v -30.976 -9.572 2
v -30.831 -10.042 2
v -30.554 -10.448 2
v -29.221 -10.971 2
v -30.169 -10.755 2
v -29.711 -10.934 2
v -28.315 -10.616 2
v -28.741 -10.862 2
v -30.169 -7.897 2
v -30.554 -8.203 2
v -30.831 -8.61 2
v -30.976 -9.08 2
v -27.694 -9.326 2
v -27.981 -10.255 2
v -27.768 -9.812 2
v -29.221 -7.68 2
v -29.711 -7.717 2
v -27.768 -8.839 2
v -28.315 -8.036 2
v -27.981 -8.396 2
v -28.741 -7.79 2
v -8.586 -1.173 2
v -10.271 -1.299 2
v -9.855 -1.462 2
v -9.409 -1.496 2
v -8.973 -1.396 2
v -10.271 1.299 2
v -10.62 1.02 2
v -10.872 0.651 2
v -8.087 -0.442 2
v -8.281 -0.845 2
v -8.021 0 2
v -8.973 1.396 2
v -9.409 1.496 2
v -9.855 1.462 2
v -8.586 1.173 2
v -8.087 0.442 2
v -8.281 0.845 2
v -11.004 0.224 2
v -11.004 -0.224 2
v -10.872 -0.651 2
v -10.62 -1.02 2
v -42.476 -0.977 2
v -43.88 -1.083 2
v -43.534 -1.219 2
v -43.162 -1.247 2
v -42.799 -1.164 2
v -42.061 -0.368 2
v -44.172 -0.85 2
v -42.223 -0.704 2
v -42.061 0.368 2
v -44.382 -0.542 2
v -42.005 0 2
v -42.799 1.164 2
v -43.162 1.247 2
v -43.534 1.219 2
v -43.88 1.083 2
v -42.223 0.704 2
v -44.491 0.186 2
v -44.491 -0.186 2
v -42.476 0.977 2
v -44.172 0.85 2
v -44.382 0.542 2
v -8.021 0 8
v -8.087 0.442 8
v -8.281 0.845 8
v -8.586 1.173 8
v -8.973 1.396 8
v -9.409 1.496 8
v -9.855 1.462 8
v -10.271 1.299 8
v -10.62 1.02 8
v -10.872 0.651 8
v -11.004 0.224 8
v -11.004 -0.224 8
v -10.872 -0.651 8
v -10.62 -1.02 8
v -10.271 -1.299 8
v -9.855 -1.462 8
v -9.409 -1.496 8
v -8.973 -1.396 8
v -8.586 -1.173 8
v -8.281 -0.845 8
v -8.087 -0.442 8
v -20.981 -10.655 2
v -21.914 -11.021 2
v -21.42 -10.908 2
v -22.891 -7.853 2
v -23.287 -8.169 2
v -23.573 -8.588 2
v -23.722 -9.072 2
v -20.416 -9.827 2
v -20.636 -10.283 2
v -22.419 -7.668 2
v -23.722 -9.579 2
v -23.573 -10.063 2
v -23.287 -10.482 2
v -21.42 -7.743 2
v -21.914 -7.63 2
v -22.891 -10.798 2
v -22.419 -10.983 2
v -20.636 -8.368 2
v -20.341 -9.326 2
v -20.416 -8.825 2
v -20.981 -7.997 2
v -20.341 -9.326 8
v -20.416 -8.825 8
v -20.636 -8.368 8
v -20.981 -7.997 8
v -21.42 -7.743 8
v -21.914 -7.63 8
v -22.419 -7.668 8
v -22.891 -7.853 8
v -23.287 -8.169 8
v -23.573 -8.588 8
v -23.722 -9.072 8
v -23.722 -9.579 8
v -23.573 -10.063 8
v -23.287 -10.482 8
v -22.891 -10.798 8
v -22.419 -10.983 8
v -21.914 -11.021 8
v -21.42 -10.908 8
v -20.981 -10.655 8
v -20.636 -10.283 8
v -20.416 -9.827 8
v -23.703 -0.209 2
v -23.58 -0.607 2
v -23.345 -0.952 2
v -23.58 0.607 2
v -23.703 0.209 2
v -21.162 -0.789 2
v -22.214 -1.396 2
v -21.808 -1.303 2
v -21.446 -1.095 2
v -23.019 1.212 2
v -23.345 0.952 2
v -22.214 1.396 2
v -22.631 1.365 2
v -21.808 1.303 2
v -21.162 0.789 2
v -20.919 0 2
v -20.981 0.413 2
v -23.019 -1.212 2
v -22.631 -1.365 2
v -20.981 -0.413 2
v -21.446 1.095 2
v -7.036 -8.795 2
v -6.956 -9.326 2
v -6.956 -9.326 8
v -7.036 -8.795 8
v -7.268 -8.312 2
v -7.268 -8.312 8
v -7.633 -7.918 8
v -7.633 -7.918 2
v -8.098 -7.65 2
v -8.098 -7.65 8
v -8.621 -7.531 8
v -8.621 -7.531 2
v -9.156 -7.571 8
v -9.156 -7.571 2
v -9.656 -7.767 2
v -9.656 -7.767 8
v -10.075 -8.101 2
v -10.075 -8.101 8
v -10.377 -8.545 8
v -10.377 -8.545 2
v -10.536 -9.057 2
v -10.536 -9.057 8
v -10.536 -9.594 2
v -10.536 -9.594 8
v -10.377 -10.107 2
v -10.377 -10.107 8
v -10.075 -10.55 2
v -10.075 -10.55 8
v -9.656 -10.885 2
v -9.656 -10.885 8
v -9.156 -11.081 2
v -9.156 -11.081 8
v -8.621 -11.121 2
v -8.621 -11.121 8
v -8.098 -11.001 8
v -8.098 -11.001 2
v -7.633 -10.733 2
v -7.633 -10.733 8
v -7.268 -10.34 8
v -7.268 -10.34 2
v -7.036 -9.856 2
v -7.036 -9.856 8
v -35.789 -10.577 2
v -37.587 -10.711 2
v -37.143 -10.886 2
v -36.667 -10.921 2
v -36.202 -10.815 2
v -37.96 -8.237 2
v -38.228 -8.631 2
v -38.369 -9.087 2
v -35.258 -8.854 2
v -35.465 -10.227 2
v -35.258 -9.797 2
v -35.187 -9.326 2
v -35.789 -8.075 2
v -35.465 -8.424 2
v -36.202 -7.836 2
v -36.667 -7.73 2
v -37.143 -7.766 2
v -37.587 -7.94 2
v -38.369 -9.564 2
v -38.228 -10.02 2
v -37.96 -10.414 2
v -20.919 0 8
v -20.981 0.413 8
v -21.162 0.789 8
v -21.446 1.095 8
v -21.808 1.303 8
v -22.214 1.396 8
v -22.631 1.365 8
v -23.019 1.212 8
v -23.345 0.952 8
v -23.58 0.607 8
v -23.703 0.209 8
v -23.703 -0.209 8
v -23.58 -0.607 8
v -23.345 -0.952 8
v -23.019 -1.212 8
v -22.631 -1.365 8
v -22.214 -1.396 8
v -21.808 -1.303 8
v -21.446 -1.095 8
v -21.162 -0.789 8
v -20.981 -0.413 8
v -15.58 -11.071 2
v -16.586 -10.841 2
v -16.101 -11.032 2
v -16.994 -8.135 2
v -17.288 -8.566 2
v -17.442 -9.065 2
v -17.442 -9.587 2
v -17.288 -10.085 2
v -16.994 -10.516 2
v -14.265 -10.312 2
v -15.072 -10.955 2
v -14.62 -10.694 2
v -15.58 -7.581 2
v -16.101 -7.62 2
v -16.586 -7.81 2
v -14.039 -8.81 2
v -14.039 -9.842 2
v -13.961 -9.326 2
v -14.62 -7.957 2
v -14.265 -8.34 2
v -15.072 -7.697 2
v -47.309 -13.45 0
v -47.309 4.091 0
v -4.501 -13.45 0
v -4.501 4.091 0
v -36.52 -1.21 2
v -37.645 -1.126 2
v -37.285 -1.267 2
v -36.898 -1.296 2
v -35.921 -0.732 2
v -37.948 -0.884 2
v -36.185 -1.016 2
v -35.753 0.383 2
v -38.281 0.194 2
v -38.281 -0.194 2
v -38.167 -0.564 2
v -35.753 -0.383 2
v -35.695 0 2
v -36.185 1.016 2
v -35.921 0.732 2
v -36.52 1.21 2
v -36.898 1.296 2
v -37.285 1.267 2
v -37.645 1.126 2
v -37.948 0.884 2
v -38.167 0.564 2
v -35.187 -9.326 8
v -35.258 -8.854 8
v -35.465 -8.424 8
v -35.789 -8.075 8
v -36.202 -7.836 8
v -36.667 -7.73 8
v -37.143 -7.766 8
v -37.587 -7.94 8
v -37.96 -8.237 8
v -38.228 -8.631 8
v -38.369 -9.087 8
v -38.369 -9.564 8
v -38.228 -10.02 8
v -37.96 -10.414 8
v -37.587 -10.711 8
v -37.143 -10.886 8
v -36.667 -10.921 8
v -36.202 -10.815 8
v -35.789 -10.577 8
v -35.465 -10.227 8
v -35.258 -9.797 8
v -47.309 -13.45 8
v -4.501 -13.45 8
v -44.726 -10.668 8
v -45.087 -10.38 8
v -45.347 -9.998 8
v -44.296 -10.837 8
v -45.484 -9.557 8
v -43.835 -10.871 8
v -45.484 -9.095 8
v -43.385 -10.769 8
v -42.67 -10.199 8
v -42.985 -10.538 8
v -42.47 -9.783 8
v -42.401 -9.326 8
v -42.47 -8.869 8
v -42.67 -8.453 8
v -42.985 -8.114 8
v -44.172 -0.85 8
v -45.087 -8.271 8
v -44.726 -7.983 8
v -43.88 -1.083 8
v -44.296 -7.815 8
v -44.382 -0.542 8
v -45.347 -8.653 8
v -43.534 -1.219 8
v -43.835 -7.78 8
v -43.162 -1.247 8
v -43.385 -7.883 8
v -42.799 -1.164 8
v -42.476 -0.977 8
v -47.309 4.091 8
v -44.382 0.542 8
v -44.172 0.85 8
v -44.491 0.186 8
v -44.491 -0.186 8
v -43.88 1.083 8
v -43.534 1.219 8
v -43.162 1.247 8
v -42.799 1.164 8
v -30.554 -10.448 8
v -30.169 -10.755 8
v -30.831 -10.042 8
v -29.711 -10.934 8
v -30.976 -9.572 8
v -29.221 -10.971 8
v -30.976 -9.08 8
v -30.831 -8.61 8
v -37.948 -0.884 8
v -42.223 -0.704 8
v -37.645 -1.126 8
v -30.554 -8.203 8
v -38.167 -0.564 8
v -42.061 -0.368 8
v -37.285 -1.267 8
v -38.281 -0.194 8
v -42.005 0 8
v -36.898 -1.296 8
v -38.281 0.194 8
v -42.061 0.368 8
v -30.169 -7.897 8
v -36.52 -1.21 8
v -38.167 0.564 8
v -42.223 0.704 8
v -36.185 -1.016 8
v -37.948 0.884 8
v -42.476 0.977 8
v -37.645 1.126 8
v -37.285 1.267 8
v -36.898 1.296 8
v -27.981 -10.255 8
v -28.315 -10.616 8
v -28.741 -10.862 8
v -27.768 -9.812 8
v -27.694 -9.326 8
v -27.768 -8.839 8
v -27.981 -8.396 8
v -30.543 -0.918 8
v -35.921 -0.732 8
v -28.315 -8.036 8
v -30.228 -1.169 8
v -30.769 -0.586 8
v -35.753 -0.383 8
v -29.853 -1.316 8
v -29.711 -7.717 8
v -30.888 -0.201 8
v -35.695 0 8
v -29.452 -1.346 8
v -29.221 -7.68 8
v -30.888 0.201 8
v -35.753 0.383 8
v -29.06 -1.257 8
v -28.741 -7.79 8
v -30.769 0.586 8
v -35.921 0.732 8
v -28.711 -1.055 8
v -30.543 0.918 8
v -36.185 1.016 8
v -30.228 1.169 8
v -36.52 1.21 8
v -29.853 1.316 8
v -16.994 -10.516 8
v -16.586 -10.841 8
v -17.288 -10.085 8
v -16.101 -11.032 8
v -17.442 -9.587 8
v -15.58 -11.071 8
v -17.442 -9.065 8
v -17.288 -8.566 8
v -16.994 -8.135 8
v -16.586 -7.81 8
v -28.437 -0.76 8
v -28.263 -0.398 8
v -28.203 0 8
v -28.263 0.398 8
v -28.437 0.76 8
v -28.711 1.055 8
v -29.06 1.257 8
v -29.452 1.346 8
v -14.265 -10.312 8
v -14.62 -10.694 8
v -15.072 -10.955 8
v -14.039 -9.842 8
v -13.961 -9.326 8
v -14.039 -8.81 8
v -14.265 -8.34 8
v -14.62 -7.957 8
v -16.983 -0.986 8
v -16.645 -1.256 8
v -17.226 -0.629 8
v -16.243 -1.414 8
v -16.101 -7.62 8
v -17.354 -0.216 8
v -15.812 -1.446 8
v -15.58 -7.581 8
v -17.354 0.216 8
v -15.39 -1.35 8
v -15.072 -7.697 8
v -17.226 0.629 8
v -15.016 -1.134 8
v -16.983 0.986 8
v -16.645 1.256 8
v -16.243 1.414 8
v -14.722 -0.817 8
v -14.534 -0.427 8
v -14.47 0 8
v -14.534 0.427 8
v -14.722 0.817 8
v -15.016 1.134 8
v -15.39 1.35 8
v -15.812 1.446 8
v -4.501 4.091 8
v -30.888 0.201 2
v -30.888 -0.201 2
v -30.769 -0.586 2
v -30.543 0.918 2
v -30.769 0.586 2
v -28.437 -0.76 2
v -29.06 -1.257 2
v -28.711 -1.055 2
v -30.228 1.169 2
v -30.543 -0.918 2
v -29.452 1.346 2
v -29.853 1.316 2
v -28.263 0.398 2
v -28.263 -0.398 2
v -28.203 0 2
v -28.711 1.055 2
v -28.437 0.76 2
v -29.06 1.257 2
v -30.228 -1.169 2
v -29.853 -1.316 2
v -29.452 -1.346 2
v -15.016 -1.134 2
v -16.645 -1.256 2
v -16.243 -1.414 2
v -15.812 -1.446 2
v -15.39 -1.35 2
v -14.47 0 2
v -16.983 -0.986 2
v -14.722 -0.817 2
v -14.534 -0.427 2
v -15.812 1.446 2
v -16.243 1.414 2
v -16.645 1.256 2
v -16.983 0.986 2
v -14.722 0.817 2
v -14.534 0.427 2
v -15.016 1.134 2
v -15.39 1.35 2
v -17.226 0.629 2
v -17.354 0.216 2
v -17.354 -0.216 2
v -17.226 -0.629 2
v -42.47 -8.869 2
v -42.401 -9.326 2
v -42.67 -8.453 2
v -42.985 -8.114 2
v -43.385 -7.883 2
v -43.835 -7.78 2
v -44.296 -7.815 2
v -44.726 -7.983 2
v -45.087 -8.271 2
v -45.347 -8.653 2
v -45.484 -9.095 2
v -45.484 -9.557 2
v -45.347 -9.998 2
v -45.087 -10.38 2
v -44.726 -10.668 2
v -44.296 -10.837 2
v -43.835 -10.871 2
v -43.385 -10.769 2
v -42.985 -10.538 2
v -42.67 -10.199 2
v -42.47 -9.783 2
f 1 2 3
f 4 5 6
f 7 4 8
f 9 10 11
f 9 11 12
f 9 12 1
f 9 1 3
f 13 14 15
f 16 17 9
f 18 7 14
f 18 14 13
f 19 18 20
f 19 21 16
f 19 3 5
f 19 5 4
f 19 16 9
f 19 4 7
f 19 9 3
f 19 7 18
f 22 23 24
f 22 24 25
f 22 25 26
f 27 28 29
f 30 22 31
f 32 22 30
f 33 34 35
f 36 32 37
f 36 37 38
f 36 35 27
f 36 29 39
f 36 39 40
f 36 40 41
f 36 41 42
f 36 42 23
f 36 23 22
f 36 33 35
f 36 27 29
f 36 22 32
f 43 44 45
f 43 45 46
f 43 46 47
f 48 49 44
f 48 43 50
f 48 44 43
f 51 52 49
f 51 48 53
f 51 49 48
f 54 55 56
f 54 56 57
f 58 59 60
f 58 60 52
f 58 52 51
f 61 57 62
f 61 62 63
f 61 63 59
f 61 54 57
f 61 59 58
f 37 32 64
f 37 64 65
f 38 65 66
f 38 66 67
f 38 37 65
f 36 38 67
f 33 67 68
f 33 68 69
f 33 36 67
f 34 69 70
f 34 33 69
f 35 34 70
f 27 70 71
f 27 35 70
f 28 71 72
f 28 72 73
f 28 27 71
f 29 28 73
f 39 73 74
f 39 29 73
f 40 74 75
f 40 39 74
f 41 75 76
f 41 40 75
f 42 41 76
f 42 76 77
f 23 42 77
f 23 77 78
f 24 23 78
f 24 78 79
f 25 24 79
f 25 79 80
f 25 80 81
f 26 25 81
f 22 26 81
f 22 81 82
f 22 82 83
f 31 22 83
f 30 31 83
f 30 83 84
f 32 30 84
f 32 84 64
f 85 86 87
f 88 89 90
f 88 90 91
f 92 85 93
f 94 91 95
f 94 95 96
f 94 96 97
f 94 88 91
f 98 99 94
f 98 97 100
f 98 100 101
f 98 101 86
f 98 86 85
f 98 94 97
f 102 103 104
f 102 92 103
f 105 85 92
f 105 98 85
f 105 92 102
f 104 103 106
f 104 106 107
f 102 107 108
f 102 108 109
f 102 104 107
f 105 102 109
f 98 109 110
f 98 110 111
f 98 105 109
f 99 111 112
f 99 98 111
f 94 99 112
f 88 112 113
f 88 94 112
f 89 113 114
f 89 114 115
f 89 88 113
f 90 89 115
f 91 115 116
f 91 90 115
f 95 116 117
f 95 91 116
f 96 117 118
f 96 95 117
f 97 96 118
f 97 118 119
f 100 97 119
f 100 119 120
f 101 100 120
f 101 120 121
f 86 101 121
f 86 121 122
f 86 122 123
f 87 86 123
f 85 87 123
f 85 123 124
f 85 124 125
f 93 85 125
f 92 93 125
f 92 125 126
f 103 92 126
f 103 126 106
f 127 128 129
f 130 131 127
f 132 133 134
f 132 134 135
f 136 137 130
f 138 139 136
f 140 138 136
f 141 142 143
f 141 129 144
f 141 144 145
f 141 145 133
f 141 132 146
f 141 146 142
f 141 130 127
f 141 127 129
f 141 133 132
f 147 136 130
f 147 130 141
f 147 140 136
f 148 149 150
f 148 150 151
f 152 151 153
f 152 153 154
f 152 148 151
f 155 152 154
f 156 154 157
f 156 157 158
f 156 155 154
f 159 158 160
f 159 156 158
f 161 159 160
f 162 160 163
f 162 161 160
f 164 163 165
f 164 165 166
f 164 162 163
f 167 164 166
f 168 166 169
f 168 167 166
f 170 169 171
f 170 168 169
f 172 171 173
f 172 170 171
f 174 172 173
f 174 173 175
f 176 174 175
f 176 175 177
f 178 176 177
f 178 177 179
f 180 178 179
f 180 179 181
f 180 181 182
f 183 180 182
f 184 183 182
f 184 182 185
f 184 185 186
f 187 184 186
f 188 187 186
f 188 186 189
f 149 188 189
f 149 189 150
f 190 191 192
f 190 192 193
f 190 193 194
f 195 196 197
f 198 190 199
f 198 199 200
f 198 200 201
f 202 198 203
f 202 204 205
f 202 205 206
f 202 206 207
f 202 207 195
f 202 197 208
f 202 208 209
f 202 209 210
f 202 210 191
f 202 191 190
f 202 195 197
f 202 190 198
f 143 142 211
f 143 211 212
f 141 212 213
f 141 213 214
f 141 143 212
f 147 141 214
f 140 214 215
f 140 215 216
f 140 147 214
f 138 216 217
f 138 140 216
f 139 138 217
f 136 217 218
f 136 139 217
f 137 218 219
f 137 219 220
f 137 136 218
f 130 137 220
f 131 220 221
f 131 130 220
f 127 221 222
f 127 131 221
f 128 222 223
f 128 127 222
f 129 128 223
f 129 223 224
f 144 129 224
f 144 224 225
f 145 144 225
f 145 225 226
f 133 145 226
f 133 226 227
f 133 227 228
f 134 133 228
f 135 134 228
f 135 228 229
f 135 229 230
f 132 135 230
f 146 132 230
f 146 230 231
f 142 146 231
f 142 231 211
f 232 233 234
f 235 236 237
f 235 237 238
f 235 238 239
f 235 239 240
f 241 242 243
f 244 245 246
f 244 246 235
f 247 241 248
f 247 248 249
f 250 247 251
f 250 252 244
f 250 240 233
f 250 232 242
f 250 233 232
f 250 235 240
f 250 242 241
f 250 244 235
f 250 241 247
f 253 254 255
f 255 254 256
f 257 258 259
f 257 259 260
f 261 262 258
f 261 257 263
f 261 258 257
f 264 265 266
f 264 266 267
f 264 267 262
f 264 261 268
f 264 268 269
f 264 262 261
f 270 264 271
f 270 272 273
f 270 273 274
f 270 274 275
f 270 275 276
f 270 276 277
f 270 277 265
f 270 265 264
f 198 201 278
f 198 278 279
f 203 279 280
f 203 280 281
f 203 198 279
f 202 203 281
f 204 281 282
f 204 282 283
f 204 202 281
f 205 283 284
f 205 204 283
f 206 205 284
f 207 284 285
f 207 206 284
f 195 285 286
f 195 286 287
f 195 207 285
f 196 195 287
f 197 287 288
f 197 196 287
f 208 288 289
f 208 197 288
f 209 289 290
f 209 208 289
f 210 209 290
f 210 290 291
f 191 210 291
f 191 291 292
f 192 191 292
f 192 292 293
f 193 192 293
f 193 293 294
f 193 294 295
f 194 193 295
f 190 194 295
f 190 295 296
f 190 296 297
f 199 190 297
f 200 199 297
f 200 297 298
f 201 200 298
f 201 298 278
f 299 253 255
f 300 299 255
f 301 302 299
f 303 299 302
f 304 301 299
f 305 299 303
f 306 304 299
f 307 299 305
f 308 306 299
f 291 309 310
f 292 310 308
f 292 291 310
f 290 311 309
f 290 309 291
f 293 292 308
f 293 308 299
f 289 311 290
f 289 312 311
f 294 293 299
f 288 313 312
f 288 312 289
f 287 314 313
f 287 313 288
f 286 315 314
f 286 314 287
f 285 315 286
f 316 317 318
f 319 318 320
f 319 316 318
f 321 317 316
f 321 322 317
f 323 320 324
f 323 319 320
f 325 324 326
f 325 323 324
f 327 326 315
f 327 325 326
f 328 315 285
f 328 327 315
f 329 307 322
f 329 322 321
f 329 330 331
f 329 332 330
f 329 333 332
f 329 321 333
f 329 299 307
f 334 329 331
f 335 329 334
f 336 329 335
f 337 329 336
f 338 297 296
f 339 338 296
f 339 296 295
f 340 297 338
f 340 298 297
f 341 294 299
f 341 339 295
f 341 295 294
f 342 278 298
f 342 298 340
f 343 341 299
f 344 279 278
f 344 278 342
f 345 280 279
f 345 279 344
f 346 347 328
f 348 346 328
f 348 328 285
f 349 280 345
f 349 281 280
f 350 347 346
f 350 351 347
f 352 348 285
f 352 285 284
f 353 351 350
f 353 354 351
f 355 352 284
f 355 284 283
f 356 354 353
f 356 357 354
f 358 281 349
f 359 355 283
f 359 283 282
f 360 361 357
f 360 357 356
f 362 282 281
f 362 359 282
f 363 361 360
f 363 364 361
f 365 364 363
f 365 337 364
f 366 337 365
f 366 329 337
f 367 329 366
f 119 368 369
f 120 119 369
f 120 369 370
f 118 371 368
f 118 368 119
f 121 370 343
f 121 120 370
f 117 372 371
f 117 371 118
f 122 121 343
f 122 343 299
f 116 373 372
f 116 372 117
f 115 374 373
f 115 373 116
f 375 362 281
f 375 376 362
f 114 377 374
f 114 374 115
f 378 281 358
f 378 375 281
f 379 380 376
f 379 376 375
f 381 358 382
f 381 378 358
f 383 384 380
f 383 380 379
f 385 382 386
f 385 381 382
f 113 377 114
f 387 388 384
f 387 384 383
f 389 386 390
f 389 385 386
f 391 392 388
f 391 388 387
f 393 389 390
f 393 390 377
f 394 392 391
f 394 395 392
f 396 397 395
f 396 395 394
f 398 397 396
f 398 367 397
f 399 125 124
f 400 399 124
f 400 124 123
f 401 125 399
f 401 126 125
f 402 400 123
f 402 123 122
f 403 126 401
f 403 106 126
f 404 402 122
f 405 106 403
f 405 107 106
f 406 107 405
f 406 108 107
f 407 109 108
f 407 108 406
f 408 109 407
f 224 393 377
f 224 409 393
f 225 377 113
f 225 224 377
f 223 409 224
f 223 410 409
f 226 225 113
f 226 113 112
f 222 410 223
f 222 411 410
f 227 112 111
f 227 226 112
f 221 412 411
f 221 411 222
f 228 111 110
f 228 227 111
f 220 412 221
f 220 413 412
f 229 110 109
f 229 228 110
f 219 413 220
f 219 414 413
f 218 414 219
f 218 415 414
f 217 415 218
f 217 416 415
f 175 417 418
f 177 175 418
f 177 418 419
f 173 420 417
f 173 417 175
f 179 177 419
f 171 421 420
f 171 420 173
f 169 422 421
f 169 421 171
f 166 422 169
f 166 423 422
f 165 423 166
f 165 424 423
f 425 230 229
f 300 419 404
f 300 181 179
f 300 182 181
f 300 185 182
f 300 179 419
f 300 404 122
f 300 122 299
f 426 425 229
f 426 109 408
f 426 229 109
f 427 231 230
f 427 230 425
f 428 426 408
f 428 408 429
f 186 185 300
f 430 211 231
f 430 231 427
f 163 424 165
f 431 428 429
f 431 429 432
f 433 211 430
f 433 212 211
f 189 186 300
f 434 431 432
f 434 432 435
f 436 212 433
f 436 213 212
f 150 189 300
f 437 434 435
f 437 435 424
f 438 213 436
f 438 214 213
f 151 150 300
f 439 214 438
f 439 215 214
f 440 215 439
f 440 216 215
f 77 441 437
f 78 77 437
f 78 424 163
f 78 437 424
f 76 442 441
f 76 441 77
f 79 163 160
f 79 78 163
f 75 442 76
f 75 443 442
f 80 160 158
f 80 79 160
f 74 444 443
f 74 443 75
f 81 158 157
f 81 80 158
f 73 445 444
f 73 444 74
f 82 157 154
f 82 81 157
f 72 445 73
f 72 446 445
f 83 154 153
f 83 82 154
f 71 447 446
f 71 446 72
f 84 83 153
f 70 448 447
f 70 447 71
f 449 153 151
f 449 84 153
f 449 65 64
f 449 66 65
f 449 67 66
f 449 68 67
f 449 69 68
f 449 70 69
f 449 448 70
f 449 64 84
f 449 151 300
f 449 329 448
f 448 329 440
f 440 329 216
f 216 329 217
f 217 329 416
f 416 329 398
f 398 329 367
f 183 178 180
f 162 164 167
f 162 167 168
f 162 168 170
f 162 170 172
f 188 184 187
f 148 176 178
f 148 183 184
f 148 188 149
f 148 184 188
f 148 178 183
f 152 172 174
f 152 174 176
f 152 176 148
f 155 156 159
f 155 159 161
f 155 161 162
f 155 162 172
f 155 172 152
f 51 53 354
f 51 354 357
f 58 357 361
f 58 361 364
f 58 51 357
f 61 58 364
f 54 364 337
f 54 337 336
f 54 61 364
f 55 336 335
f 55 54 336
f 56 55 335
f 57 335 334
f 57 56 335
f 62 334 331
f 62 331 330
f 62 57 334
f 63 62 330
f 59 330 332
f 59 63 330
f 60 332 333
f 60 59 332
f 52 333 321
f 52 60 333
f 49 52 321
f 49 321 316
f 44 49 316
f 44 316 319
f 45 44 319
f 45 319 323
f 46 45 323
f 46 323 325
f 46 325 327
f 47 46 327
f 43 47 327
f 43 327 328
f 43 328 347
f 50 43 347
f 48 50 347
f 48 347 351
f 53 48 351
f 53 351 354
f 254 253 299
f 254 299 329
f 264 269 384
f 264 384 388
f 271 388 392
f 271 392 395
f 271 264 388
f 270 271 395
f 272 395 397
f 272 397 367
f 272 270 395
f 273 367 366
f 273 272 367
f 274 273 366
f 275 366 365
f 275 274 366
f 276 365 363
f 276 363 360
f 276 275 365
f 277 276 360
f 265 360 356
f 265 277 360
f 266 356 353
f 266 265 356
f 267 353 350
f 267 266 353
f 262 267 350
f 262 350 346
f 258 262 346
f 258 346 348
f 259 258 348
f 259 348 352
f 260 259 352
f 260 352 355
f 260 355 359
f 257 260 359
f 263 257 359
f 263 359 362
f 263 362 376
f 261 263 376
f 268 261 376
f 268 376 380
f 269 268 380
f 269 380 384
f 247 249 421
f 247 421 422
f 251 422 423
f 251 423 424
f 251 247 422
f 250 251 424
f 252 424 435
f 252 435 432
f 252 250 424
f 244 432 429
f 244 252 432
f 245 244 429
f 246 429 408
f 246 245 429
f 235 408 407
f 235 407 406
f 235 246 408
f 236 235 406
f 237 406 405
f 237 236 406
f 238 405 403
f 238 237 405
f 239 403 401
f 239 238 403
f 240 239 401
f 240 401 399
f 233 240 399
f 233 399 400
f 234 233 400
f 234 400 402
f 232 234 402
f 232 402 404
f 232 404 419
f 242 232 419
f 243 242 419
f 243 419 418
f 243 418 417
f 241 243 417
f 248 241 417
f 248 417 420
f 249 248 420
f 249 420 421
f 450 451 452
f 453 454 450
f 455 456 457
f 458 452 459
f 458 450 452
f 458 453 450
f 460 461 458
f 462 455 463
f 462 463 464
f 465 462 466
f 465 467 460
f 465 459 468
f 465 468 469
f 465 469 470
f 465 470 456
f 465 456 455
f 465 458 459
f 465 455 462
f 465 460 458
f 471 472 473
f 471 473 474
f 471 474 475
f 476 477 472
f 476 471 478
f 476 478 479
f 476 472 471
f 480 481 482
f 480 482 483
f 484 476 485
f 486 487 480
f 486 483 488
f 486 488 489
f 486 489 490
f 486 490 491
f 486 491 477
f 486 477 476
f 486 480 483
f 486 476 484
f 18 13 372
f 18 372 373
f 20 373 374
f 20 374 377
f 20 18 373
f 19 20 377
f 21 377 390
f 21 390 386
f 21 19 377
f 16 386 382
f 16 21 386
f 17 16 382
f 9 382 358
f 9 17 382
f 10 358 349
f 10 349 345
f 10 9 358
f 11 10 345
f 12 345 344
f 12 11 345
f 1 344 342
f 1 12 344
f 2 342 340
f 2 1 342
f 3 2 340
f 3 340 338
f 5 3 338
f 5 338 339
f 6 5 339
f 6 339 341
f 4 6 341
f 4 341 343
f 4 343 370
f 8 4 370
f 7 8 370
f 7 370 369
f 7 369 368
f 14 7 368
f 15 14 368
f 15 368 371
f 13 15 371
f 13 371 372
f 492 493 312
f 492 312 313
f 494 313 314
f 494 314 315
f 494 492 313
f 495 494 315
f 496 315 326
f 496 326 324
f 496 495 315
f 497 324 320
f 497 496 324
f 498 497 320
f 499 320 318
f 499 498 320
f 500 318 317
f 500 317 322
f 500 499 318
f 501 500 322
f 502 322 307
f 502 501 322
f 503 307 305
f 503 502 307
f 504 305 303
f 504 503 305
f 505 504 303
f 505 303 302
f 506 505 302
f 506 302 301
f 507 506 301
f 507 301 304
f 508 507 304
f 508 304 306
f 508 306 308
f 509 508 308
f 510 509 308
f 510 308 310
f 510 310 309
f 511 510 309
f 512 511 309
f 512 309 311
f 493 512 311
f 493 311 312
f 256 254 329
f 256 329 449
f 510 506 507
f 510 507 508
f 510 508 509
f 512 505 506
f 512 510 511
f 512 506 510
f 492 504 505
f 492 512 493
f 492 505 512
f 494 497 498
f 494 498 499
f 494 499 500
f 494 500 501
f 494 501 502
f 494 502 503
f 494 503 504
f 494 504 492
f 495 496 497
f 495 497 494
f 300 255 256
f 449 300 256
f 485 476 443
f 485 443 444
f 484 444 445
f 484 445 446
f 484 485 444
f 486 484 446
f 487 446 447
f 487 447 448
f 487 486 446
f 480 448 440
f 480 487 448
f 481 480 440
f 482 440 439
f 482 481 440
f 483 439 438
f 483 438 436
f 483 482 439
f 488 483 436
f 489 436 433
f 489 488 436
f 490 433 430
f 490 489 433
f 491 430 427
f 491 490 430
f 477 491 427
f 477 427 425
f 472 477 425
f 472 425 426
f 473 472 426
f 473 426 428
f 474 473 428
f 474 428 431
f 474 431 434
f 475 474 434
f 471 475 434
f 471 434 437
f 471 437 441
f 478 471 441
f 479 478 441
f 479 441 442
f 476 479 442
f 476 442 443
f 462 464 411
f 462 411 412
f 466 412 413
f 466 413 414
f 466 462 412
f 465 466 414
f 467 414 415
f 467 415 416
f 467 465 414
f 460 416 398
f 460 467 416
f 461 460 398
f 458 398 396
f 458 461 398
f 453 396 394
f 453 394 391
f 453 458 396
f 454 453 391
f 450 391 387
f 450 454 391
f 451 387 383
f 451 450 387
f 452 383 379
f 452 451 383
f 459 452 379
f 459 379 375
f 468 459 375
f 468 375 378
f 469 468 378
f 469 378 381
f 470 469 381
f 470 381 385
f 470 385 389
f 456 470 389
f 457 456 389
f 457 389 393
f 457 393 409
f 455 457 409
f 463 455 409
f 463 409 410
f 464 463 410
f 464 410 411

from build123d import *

# Parameters (mm, degrees)
F0_W     = 42.807285
F0_H     = 17.540547
F0_R     = 1.55
F0_R_2   = 1.6
F0_R_3   = 1.65
F0_R_4   = 1.7
F0_R_5   = 1.75
F0_R_6   = 1.8
F0_R_7   = 1.25
F0_R_8   = 1.3
F0_R_9   = 1.35
F0_R_10  = 1.4
F0_R_11  = 1.45
F0_R_12  = 1.5
F1_DEPTH = 8
F2_DEPTH = 2


with BuildPart() as f1:
    # F0 (on Top) → F1 (new body)
    with BuildSketch(Plane.XY):
        with Locations((-25.905089, -4.67933)):
            Rectangle(F0_W, F0_H)
        with Locations((-43.950986, -9.325703)):
            Circle(F0_R, mode=Mode.SUBTRACT)
        with Locations((-36.78672, -9.325703)):
            Circle(F0_R_2, mode=Mode.SUBTRACT)
        with Locations((-29.344233, -9.325703)):
            Circle(F0_R_3, mode=Mode.SUBTRACT)
        with Locations((-22.040857, -9.325703)):
            Circle(F0_R_4, mode=Mode.SUBTRACT)
        with Locations((-15.711265, -9.325703)):
            Circle(F0_R_5, mode=Mode.SUBTRACT)
        with Locations((-8.755669, -9.325703)):
            Circle(F0_R_6, mode=Mode.SUBTRACT)
        with Locations((-43.255426, 0)):
            Circle(F0_R_7, mode=Mode.SUBTRACT)
        with Locations((-36.995389, 0)):
            Circle(F0_R_8, mode=Mode.SUBTRACT)
        with Locations((-29.552901, 0)):
            Circle(F0_R_9, mode=Mode.SUBTRACT)
        with Locations((-22.319082, 0)):
            Circle(F0_R_10, mode=Mode.SUBTRACT)
        with Locations((-15.919933, 0)):
            Circle(F0_R_11, mode=Mode.SUBTRACT)
        with Locations((-9.520785, 0)):
            Circle(F0_R_12, mode=Mode.SUBTRACT)
    extrude(amount=F1_DEPTH)

    # F0 (on Top) → F2 (join)
    with BuildSketch(Plane.XY):
        with Locations((-43.950986, -9.325703)):
            Circle(F0_R)
        with Locations((-36.78672, -9.325703)):
            Circle(F0_R_2)
        with Locations((-29.344233, -9.325703)):
            Circle(F0_R_3)
        with Locations((-22.040857, -9.325703)):
            Circle(F0_R_4)
        with Locations((-15.711265, -9.325703)):
            Circle(F0_R_5)
        with Locations((-8.755669, -9.325703)):
            Circle(F0_R_6)
        with Locations((-9.520785, 0)):
            Circle(F0_R_12)
        with Locations((-15.919933, 0)):
            Circle(F0_R_11)
        with Locations((-22.319082, 0)):
            Circle(F0_R_10)
        with Locations((-29.552901, 0)):
            Circle(F0_R_9)
        with Locations((-36.995389, 0)):
            Circle(F0_R_8)
        with Locations((-43.255426, 0)):
            Circle(F0_R_7)
    extrude(amount=F2_DEPTH)


solid = f1.part
